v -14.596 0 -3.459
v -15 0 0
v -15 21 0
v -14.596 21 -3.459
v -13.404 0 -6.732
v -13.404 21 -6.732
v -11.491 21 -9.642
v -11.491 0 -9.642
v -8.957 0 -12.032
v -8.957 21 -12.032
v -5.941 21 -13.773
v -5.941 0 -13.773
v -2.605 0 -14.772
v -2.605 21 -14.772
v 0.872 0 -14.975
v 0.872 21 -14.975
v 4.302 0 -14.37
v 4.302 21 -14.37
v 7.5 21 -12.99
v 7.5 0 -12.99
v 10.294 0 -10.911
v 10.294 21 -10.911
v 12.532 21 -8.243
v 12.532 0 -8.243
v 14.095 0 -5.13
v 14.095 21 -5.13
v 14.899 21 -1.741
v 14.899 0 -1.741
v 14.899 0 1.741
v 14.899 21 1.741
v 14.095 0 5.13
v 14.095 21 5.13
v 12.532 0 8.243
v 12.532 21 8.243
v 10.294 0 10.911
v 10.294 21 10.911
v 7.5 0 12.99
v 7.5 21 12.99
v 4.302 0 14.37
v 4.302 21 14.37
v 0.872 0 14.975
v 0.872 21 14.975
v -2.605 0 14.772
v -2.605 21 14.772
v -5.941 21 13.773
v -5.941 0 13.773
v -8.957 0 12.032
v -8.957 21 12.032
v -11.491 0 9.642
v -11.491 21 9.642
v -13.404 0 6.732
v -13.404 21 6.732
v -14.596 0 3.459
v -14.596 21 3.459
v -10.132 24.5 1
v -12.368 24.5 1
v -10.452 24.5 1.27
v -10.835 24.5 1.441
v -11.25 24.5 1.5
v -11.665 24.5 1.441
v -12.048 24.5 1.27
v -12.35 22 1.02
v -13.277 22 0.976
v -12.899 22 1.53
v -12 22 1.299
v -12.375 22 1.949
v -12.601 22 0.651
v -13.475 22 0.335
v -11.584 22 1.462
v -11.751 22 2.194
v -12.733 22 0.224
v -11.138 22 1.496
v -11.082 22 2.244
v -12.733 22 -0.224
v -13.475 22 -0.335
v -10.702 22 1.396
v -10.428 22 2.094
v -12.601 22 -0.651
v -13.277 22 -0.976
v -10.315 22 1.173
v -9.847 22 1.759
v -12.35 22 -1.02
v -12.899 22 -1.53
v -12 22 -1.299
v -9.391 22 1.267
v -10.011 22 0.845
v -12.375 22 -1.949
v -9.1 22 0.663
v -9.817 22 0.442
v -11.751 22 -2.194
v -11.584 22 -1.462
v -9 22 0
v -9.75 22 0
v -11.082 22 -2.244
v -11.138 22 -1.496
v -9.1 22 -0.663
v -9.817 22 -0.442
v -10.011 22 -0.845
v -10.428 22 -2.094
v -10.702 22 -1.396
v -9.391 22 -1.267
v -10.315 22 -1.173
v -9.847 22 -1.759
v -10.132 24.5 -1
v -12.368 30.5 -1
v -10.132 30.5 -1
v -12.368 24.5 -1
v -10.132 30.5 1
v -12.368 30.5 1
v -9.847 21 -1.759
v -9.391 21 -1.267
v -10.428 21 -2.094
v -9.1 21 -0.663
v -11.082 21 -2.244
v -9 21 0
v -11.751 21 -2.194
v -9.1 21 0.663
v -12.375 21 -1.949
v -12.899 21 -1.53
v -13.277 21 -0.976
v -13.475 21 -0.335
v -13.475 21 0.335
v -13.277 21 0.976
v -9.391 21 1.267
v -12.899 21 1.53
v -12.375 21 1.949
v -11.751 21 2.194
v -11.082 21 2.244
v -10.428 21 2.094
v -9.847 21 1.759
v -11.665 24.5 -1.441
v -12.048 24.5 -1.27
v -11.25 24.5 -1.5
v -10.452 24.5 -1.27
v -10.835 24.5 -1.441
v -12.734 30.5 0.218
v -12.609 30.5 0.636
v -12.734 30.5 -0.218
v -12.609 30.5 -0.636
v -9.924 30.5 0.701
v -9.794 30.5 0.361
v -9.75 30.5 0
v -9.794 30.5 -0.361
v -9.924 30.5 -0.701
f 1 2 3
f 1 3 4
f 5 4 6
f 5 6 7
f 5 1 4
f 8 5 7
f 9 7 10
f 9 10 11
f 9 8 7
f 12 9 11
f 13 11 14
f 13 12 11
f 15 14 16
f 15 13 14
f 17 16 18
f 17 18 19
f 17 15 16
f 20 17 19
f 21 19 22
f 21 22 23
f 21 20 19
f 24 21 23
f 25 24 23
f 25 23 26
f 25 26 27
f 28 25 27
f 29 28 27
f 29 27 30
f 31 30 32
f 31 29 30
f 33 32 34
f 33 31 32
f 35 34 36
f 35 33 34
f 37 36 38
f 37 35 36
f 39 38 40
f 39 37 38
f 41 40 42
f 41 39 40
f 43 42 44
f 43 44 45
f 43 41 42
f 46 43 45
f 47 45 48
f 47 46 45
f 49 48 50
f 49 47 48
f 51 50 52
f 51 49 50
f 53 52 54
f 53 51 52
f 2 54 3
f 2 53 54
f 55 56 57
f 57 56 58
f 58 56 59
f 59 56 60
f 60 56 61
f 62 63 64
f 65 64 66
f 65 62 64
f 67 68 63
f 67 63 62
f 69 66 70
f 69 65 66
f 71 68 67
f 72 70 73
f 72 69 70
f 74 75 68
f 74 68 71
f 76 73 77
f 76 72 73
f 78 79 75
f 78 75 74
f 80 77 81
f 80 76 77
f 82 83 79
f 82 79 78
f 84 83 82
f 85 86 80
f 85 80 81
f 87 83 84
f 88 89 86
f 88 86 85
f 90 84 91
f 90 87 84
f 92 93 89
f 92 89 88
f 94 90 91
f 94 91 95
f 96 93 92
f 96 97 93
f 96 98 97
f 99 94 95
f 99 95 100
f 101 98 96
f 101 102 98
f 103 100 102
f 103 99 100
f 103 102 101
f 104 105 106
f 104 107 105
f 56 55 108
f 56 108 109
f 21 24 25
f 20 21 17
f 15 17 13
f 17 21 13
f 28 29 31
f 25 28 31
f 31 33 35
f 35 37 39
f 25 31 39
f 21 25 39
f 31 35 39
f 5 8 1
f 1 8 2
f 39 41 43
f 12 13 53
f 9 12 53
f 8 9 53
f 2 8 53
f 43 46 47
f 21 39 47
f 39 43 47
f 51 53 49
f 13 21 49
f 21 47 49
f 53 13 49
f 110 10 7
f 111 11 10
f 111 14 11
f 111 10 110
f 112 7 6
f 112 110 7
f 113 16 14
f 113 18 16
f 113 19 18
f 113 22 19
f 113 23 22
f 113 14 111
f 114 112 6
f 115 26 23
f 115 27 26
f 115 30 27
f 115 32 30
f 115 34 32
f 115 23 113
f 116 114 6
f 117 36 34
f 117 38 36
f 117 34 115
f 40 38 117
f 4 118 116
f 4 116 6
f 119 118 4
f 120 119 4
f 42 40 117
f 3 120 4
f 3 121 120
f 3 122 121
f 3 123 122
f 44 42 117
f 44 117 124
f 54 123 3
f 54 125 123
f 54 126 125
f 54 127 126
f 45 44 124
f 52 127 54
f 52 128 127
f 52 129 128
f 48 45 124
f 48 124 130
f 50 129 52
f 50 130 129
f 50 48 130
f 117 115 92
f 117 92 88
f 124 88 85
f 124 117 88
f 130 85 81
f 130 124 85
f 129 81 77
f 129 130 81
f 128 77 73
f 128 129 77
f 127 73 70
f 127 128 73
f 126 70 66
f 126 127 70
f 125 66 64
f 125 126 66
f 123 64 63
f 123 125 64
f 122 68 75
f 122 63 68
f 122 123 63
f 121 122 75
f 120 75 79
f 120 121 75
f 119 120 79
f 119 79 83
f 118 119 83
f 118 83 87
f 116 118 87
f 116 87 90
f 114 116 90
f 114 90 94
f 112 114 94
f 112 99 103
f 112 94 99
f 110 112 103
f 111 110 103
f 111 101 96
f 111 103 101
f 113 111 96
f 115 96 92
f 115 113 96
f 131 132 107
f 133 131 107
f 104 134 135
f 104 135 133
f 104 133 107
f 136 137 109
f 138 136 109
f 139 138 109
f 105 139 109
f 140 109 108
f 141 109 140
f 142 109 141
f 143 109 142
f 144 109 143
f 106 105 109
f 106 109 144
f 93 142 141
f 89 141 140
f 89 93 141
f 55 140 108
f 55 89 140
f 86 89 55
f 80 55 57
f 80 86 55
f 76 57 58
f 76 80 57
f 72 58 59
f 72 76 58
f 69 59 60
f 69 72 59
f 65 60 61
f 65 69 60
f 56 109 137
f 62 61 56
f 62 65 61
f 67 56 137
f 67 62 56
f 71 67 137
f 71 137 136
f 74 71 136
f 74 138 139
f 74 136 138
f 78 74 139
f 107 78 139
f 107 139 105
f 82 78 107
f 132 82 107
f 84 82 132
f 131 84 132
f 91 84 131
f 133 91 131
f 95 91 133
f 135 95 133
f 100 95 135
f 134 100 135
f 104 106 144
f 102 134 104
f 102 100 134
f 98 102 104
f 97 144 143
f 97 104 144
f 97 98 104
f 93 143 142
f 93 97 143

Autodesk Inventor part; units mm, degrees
ref_plane "YZ Plane" through (0, 0, 0) normal (1, 0, 0) x (0, 1, 0)
ref_plane "XZ Plane" through (0, 0, 0) normal (0, 1, 0) x (-1, 0, 0)
ref_plane "XY Plane" through (0, 0, 0) normal (0, 0, 1) x (1, 0, 0)
sketch "Sketch1" plane through (0, 0, 0) normal (0, 1, 0) x (-1, 0, 0)
  circle A0 centre (0, 0) radius 15
  line L0 (-7.5, 13) -> (-7.4833, 13)
  line L1 (7.4833, 13) -> (7.5, 13)
  point P0 (0, 15)
  dimension "d0" = 30
extrude "Extrusion1" add sketch "Sketch1" along normal blind 21
sketch "Sketch2" plane through (0, 21, 0) normal (0, 1, 0) x (1, 0, 0)
  circle A0 centre (-11.25, 0) radius 2.25
  circle A1 centre (0, 0) radius 15 projected
  dimension "d3" = 4.5
  dimension "d4" = 1.5
extrude "Extrusion2" add sketch "Sketch2" along normal blind 1 contours A0
sketch "Sketch3" plane through (-11.25, 22, 0) normal (0, 1, 0) x (1, 0, 0)
  circle A0 centre (0, 0) radius 1.5
  point P0 (11.25, 0)
  dimension "d7" = 3
extrude "Extrusion3" add sketch "Sketch3" along normal blind 2.5
sketch "Sketch4" plane through (-11.25, 24.5, 0) normal (0, 1, 0) x (1, 0, 0)
  line L0 (1.118, -1) -> (-1.118, -1)
  line L1 (-1.118, 1) -> (1.118, 1)
  line L2 (1.5, -1) -> (-1.882, 1) construction
  line L3 (-1.882, -1) -> (1.0655, 1.0558) construction
  circle A0 centre (0, 0) radius 1.5 projected
  point P0 (11.25, 0)
  point P1 (-0.3302, 0.0823)
  dimension "d10" = 3
  dimension "d11" = 0.5
  dimension "d12" = 0.5
extrude "Extrusion4" add sketch "Sketch4" along normal blind 6 contours L0 A0 L1
properties part number "stepperMotor"
